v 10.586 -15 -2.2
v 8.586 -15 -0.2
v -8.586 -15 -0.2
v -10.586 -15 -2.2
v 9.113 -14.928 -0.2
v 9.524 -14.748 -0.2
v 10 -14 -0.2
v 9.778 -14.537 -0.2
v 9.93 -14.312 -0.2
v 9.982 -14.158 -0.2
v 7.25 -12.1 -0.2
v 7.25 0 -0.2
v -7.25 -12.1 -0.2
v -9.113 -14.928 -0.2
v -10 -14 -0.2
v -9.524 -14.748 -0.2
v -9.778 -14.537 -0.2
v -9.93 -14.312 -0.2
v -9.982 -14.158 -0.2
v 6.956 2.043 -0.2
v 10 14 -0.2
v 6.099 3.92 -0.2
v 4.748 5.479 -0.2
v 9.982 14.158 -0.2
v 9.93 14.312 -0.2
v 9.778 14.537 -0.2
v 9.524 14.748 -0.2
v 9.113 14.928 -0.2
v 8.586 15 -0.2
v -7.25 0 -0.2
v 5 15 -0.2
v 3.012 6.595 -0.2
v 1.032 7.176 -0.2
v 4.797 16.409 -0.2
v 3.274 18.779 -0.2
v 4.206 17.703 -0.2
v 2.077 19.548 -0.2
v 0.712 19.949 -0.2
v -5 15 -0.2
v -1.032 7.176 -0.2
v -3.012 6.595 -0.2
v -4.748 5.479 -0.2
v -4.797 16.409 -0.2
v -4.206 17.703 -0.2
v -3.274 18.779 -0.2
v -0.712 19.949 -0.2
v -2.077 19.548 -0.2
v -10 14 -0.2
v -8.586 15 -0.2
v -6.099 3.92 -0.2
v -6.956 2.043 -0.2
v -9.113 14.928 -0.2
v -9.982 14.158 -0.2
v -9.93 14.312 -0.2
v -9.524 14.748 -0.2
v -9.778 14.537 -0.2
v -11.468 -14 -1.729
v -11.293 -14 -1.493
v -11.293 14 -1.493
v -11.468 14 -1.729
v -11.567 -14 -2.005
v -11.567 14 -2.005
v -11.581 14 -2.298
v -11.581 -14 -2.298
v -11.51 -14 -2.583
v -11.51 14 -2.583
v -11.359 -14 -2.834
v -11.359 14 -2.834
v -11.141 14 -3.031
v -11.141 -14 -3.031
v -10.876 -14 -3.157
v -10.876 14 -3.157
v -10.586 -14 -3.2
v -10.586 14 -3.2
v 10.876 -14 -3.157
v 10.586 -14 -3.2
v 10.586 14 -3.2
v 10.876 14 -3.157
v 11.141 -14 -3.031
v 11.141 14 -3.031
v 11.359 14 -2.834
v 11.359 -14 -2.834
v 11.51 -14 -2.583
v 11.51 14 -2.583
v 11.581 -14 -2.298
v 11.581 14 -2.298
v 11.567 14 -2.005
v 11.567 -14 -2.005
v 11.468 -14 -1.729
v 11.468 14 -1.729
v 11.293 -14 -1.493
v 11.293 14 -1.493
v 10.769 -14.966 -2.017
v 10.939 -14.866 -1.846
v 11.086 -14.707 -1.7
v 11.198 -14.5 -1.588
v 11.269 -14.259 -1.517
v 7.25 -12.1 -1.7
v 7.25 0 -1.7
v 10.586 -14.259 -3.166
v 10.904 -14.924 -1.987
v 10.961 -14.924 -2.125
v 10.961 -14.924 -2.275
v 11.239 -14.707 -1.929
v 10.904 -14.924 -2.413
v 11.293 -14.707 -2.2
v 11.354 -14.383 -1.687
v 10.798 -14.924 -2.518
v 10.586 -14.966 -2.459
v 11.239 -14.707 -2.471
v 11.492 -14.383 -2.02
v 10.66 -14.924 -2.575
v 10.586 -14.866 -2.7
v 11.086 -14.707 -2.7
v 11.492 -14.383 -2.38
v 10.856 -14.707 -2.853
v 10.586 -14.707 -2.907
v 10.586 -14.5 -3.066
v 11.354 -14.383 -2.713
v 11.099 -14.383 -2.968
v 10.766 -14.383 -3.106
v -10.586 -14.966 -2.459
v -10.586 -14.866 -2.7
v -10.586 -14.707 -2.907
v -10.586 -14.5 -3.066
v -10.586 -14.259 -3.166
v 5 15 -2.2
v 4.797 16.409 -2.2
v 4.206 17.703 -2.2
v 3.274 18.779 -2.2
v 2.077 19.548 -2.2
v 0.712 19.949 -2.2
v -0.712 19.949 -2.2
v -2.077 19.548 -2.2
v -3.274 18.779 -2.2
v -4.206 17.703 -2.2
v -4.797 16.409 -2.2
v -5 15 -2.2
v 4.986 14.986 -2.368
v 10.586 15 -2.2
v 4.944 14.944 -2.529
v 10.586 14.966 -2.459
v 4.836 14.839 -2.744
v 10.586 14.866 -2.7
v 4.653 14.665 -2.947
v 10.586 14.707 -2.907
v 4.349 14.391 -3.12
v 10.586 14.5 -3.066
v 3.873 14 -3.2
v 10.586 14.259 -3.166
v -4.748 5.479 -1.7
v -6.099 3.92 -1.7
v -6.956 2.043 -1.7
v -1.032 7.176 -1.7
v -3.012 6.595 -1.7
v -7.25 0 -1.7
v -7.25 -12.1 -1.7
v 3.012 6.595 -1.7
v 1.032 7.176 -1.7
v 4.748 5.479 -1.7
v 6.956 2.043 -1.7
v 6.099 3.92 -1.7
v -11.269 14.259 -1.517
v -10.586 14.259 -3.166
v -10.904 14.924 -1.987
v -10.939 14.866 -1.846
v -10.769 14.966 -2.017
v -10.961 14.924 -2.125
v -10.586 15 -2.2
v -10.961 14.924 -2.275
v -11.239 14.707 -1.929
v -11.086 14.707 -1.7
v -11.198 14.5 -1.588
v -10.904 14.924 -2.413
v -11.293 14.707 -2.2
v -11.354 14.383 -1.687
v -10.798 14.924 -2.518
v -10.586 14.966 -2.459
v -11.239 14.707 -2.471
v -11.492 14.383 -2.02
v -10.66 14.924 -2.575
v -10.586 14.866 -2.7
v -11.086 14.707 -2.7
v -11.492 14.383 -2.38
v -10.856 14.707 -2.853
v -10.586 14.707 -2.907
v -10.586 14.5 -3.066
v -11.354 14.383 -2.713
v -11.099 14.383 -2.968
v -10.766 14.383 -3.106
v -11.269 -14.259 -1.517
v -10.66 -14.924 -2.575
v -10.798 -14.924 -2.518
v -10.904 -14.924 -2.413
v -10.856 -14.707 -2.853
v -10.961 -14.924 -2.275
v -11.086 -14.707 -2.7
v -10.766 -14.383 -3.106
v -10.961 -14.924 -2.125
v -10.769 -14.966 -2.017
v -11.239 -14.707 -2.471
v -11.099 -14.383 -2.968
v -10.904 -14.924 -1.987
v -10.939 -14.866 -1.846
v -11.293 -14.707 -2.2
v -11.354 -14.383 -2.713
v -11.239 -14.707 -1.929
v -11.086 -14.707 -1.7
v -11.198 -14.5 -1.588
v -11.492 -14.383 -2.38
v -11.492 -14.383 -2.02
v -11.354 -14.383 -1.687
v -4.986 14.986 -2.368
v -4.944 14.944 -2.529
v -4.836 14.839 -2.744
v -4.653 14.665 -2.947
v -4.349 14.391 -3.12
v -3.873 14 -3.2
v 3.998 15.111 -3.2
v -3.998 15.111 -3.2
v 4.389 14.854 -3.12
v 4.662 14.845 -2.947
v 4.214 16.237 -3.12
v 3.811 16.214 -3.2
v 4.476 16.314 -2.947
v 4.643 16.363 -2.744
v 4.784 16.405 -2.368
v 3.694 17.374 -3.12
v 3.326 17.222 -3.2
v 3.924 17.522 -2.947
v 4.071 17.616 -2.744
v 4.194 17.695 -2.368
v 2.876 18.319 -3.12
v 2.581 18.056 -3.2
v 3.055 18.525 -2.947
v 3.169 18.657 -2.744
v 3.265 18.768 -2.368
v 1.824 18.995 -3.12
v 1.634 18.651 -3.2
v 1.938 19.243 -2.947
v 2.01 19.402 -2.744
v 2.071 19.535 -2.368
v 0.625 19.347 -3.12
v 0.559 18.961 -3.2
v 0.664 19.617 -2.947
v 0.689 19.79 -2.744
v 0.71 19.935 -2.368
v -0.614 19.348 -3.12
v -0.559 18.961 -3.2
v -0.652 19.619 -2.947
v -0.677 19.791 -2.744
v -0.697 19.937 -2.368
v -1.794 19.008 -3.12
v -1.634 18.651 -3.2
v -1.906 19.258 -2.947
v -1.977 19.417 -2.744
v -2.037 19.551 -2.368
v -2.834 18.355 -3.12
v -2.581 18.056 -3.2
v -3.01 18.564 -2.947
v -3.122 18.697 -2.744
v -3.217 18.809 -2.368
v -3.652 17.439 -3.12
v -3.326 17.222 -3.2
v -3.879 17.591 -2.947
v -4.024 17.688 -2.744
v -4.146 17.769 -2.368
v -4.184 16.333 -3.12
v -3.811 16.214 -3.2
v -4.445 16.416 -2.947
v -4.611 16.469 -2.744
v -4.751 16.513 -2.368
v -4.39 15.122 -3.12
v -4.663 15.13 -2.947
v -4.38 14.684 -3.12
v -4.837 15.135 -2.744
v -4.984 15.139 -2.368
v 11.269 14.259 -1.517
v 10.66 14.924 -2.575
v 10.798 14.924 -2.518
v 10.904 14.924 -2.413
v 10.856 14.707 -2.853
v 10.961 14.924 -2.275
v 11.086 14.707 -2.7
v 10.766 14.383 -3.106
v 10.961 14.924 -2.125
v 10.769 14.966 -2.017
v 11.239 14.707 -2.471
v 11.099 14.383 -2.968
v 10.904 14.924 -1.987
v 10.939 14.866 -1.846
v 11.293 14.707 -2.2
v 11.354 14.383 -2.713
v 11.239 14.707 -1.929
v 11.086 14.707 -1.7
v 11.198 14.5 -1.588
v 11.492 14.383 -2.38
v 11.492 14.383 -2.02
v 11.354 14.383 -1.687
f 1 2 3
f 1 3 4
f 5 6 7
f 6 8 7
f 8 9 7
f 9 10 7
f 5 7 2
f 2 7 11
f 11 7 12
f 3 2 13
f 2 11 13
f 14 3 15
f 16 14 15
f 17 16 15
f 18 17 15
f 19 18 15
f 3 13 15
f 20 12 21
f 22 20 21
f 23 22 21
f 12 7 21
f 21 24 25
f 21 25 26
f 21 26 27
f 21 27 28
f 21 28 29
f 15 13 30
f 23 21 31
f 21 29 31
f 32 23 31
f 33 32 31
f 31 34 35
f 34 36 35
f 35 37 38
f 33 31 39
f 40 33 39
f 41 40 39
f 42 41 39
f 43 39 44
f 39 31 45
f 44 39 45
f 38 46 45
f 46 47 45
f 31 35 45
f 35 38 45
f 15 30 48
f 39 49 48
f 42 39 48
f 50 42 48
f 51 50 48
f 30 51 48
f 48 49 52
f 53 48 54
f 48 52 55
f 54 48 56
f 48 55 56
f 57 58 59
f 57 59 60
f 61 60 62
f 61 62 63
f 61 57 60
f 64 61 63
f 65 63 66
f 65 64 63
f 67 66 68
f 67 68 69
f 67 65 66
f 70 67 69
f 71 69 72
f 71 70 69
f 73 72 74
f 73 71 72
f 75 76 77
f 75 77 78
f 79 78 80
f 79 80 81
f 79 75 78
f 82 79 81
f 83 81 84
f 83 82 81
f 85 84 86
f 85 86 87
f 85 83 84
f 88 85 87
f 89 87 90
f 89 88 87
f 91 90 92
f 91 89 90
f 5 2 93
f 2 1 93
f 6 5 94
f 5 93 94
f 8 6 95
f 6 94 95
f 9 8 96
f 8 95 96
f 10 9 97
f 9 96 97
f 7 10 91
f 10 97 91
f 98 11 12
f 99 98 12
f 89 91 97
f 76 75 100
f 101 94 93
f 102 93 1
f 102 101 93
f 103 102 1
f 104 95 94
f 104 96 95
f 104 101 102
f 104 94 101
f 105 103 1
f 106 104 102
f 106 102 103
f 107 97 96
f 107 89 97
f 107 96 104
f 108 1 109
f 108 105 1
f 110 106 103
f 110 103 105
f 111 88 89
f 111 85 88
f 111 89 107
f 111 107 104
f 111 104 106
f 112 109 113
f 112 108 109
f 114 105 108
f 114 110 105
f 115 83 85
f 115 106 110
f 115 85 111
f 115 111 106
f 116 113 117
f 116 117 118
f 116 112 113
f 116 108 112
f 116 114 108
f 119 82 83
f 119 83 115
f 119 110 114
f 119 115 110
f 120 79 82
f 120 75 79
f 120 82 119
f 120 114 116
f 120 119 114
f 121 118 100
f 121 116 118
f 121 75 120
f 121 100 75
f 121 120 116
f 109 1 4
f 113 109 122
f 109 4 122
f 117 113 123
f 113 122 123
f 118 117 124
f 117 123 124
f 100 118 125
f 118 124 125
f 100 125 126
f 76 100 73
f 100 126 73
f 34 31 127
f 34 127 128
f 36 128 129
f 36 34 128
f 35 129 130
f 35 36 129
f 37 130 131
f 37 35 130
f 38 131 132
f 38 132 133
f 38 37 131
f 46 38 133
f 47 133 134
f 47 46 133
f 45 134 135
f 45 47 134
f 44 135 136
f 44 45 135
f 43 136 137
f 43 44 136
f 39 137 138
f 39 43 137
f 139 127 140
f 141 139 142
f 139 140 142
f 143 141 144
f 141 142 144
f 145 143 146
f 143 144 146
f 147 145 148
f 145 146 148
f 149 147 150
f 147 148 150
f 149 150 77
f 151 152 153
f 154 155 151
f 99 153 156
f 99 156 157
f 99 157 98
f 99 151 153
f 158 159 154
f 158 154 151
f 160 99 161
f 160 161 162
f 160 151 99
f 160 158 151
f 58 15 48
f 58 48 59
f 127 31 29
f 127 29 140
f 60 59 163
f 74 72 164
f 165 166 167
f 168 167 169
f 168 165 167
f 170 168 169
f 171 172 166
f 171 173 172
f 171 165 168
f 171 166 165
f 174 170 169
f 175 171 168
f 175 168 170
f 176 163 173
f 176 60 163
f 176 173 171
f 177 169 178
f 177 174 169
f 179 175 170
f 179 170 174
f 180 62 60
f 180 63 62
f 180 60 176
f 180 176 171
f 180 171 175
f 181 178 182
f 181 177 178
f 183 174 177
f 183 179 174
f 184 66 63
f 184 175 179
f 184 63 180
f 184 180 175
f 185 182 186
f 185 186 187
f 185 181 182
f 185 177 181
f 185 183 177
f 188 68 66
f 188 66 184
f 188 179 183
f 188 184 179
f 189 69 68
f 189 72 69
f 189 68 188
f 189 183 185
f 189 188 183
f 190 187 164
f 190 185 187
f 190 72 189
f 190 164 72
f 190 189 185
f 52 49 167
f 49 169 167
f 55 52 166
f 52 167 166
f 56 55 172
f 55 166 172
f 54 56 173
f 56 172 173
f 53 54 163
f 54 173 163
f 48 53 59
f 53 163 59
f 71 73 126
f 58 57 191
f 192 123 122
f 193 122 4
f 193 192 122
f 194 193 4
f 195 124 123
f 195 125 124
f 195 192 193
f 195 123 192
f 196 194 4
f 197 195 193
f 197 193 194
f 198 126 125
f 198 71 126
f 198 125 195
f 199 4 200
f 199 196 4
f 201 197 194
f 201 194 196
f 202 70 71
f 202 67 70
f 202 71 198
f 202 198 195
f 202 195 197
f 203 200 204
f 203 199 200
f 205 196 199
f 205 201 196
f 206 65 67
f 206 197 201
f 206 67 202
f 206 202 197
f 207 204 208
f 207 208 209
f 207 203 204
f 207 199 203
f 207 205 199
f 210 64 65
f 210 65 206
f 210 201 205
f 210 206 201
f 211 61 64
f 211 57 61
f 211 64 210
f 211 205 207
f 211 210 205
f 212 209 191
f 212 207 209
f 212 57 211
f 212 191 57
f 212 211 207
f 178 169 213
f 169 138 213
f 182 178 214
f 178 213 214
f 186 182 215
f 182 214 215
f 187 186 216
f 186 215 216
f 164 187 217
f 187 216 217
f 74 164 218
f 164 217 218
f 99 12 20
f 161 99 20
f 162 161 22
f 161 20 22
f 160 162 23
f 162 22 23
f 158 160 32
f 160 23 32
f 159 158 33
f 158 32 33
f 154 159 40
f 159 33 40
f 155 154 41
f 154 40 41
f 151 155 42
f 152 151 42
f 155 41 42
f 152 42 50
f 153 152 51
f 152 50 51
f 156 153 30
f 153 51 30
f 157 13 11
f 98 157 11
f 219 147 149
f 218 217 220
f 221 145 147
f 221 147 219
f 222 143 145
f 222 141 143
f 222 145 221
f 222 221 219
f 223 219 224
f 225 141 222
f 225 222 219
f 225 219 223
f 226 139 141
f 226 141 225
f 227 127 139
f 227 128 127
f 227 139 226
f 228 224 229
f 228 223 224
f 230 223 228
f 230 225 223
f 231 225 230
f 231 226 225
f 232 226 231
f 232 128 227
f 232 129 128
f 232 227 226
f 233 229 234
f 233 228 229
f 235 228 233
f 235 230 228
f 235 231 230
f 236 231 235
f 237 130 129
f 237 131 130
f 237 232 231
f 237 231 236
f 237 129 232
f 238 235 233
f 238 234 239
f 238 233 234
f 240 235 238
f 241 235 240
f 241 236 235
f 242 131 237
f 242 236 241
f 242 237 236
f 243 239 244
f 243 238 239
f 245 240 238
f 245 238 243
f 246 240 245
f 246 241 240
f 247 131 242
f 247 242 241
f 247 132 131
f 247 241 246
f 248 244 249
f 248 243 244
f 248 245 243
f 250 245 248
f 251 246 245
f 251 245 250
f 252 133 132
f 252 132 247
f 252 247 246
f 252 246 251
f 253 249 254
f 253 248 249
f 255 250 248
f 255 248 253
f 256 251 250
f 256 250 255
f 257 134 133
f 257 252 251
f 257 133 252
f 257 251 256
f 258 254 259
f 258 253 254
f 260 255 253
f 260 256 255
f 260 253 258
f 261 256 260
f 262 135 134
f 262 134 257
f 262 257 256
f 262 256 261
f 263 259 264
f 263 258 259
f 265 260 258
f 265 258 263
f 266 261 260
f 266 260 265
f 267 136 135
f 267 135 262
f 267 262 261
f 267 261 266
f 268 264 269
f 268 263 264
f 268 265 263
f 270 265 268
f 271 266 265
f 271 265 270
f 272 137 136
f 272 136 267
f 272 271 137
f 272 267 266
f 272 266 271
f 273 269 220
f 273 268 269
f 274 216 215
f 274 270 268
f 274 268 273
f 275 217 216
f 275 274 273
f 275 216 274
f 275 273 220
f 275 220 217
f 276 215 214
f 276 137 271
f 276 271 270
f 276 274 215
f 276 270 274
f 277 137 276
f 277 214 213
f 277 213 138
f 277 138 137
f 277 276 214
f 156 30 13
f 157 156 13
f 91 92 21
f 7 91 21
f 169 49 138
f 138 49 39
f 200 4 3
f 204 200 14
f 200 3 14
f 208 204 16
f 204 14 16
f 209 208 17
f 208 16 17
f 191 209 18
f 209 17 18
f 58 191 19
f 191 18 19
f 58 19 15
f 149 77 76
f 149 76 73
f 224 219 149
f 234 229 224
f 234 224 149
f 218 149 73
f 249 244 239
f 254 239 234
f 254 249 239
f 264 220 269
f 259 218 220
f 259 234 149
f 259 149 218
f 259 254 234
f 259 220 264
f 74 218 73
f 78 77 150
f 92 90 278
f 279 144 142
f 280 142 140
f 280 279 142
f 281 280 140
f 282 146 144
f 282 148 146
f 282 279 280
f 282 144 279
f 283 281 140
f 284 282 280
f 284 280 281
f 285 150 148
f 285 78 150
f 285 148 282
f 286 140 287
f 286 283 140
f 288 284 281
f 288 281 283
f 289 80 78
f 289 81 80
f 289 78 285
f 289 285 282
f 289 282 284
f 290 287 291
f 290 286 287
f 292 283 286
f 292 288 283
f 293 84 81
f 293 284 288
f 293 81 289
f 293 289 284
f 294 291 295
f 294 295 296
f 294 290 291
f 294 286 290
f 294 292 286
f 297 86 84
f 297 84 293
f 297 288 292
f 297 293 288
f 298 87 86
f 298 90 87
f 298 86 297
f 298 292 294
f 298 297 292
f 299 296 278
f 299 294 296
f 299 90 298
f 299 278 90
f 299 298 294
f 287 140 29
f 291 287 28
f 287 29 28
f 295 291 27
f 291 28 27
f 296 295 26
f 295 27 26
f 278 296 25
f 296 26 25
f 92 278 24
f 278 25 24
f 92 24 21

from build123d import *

# Parameters (mm, degrees)
PAD025_DEPTH         = 3
POCKET010_DEPTH      = 1.5
SKETCH059_W          = 32.687891
SKETCH059_H          = 10.975497
POCKET015_DEPTH      = 20.001
POCKET015_DEPTH_BACK = 15.001
FILLET006_R          = 1


with BuildPart() as part:
    # Sketch049 → Pad025 (new body)
    with BuildSketch(Plane.XY):
        with BuildLine():
            Line((-13, 15), (-5, 15))
            ThreePointArc((5, 15), (0, 20), (-5, 15))
            Line((5, 15), (13, 15))
            Line((13, 15), (13, -15))
            Line((13, -15), (-13, -15))
            Line((-13, -15), (-13, 15))
        make_face()
    extrude(amount=-PAD025_DEPTH)

    # Sketch050 → Pocket010 (cut)
    with BuildSketch(Plane.XY):
        with BuildLine():
            ThreePointArc((7.25, 0), (0, 7.25), (-7.25, 0))
            Line((-7.25, 0), (-7.25, -12.1))
            Line((-7.25, -12.1), (7.25, -12.1))
            Line((7.25, -12.1), (7.25, 0))
        make_face()
    extrude(amount=-POCKET010_DEPTH, mode=Mode.SUBTRACT)

    # Sketch059 → Pocket015 (cut, two sides)
    with BuildSketch(Plane.XZ) as pocket015_sk:
        with Locations((-0.0886585, -1.0893715)):
            Rectangle(SKETCH059_W, SKETCH059_H)
        with BuildLine():
            Line((10, 0), (-10, 0))
            Line((-10, 0), (-11.2928932188, -1.2928932188))
            ThreePointArc((-11.2928932188, -1.2928932188), (-11.5096659701, -2.3826834324), (-10.5857864376, -3))
            Line((-10.5857864376, -3), (10.5857864376, -3))
            ThreePointArc((10.5857864376, -3), (11.5096659701, -2.3826834324), (11.2928932188, -1.2928932188))
            Line((11.2928932188, -1.2928932188), (10, 0))
        make_face(mode=Mode.SUBTRACT)
    extrude(amount=-POCKET015_DEPTH, mode=Mode.SUBTRACT)
    extrude(pocket015_sk.sketch, amount=POCKET015_DEPTH_BACK, mode=Mode.SUBTRACT)

    # Fillet006
    fillet006_edges = [part.edges().sort_by_distance(p)[0] for p in [
        (0, -15, -3),
        (0, 20, -3),
        (7.792893, 15, -3),
        (-7.792893, 15, -3),
    ]]
    fillet(fillet006_edges, radius=FILLET006_R)


with BuildPart() as part_1:
    # Body017 placement: moved
    add(part.part.moved(Location((0, 0, -0.2))))


solid = part_1.part
